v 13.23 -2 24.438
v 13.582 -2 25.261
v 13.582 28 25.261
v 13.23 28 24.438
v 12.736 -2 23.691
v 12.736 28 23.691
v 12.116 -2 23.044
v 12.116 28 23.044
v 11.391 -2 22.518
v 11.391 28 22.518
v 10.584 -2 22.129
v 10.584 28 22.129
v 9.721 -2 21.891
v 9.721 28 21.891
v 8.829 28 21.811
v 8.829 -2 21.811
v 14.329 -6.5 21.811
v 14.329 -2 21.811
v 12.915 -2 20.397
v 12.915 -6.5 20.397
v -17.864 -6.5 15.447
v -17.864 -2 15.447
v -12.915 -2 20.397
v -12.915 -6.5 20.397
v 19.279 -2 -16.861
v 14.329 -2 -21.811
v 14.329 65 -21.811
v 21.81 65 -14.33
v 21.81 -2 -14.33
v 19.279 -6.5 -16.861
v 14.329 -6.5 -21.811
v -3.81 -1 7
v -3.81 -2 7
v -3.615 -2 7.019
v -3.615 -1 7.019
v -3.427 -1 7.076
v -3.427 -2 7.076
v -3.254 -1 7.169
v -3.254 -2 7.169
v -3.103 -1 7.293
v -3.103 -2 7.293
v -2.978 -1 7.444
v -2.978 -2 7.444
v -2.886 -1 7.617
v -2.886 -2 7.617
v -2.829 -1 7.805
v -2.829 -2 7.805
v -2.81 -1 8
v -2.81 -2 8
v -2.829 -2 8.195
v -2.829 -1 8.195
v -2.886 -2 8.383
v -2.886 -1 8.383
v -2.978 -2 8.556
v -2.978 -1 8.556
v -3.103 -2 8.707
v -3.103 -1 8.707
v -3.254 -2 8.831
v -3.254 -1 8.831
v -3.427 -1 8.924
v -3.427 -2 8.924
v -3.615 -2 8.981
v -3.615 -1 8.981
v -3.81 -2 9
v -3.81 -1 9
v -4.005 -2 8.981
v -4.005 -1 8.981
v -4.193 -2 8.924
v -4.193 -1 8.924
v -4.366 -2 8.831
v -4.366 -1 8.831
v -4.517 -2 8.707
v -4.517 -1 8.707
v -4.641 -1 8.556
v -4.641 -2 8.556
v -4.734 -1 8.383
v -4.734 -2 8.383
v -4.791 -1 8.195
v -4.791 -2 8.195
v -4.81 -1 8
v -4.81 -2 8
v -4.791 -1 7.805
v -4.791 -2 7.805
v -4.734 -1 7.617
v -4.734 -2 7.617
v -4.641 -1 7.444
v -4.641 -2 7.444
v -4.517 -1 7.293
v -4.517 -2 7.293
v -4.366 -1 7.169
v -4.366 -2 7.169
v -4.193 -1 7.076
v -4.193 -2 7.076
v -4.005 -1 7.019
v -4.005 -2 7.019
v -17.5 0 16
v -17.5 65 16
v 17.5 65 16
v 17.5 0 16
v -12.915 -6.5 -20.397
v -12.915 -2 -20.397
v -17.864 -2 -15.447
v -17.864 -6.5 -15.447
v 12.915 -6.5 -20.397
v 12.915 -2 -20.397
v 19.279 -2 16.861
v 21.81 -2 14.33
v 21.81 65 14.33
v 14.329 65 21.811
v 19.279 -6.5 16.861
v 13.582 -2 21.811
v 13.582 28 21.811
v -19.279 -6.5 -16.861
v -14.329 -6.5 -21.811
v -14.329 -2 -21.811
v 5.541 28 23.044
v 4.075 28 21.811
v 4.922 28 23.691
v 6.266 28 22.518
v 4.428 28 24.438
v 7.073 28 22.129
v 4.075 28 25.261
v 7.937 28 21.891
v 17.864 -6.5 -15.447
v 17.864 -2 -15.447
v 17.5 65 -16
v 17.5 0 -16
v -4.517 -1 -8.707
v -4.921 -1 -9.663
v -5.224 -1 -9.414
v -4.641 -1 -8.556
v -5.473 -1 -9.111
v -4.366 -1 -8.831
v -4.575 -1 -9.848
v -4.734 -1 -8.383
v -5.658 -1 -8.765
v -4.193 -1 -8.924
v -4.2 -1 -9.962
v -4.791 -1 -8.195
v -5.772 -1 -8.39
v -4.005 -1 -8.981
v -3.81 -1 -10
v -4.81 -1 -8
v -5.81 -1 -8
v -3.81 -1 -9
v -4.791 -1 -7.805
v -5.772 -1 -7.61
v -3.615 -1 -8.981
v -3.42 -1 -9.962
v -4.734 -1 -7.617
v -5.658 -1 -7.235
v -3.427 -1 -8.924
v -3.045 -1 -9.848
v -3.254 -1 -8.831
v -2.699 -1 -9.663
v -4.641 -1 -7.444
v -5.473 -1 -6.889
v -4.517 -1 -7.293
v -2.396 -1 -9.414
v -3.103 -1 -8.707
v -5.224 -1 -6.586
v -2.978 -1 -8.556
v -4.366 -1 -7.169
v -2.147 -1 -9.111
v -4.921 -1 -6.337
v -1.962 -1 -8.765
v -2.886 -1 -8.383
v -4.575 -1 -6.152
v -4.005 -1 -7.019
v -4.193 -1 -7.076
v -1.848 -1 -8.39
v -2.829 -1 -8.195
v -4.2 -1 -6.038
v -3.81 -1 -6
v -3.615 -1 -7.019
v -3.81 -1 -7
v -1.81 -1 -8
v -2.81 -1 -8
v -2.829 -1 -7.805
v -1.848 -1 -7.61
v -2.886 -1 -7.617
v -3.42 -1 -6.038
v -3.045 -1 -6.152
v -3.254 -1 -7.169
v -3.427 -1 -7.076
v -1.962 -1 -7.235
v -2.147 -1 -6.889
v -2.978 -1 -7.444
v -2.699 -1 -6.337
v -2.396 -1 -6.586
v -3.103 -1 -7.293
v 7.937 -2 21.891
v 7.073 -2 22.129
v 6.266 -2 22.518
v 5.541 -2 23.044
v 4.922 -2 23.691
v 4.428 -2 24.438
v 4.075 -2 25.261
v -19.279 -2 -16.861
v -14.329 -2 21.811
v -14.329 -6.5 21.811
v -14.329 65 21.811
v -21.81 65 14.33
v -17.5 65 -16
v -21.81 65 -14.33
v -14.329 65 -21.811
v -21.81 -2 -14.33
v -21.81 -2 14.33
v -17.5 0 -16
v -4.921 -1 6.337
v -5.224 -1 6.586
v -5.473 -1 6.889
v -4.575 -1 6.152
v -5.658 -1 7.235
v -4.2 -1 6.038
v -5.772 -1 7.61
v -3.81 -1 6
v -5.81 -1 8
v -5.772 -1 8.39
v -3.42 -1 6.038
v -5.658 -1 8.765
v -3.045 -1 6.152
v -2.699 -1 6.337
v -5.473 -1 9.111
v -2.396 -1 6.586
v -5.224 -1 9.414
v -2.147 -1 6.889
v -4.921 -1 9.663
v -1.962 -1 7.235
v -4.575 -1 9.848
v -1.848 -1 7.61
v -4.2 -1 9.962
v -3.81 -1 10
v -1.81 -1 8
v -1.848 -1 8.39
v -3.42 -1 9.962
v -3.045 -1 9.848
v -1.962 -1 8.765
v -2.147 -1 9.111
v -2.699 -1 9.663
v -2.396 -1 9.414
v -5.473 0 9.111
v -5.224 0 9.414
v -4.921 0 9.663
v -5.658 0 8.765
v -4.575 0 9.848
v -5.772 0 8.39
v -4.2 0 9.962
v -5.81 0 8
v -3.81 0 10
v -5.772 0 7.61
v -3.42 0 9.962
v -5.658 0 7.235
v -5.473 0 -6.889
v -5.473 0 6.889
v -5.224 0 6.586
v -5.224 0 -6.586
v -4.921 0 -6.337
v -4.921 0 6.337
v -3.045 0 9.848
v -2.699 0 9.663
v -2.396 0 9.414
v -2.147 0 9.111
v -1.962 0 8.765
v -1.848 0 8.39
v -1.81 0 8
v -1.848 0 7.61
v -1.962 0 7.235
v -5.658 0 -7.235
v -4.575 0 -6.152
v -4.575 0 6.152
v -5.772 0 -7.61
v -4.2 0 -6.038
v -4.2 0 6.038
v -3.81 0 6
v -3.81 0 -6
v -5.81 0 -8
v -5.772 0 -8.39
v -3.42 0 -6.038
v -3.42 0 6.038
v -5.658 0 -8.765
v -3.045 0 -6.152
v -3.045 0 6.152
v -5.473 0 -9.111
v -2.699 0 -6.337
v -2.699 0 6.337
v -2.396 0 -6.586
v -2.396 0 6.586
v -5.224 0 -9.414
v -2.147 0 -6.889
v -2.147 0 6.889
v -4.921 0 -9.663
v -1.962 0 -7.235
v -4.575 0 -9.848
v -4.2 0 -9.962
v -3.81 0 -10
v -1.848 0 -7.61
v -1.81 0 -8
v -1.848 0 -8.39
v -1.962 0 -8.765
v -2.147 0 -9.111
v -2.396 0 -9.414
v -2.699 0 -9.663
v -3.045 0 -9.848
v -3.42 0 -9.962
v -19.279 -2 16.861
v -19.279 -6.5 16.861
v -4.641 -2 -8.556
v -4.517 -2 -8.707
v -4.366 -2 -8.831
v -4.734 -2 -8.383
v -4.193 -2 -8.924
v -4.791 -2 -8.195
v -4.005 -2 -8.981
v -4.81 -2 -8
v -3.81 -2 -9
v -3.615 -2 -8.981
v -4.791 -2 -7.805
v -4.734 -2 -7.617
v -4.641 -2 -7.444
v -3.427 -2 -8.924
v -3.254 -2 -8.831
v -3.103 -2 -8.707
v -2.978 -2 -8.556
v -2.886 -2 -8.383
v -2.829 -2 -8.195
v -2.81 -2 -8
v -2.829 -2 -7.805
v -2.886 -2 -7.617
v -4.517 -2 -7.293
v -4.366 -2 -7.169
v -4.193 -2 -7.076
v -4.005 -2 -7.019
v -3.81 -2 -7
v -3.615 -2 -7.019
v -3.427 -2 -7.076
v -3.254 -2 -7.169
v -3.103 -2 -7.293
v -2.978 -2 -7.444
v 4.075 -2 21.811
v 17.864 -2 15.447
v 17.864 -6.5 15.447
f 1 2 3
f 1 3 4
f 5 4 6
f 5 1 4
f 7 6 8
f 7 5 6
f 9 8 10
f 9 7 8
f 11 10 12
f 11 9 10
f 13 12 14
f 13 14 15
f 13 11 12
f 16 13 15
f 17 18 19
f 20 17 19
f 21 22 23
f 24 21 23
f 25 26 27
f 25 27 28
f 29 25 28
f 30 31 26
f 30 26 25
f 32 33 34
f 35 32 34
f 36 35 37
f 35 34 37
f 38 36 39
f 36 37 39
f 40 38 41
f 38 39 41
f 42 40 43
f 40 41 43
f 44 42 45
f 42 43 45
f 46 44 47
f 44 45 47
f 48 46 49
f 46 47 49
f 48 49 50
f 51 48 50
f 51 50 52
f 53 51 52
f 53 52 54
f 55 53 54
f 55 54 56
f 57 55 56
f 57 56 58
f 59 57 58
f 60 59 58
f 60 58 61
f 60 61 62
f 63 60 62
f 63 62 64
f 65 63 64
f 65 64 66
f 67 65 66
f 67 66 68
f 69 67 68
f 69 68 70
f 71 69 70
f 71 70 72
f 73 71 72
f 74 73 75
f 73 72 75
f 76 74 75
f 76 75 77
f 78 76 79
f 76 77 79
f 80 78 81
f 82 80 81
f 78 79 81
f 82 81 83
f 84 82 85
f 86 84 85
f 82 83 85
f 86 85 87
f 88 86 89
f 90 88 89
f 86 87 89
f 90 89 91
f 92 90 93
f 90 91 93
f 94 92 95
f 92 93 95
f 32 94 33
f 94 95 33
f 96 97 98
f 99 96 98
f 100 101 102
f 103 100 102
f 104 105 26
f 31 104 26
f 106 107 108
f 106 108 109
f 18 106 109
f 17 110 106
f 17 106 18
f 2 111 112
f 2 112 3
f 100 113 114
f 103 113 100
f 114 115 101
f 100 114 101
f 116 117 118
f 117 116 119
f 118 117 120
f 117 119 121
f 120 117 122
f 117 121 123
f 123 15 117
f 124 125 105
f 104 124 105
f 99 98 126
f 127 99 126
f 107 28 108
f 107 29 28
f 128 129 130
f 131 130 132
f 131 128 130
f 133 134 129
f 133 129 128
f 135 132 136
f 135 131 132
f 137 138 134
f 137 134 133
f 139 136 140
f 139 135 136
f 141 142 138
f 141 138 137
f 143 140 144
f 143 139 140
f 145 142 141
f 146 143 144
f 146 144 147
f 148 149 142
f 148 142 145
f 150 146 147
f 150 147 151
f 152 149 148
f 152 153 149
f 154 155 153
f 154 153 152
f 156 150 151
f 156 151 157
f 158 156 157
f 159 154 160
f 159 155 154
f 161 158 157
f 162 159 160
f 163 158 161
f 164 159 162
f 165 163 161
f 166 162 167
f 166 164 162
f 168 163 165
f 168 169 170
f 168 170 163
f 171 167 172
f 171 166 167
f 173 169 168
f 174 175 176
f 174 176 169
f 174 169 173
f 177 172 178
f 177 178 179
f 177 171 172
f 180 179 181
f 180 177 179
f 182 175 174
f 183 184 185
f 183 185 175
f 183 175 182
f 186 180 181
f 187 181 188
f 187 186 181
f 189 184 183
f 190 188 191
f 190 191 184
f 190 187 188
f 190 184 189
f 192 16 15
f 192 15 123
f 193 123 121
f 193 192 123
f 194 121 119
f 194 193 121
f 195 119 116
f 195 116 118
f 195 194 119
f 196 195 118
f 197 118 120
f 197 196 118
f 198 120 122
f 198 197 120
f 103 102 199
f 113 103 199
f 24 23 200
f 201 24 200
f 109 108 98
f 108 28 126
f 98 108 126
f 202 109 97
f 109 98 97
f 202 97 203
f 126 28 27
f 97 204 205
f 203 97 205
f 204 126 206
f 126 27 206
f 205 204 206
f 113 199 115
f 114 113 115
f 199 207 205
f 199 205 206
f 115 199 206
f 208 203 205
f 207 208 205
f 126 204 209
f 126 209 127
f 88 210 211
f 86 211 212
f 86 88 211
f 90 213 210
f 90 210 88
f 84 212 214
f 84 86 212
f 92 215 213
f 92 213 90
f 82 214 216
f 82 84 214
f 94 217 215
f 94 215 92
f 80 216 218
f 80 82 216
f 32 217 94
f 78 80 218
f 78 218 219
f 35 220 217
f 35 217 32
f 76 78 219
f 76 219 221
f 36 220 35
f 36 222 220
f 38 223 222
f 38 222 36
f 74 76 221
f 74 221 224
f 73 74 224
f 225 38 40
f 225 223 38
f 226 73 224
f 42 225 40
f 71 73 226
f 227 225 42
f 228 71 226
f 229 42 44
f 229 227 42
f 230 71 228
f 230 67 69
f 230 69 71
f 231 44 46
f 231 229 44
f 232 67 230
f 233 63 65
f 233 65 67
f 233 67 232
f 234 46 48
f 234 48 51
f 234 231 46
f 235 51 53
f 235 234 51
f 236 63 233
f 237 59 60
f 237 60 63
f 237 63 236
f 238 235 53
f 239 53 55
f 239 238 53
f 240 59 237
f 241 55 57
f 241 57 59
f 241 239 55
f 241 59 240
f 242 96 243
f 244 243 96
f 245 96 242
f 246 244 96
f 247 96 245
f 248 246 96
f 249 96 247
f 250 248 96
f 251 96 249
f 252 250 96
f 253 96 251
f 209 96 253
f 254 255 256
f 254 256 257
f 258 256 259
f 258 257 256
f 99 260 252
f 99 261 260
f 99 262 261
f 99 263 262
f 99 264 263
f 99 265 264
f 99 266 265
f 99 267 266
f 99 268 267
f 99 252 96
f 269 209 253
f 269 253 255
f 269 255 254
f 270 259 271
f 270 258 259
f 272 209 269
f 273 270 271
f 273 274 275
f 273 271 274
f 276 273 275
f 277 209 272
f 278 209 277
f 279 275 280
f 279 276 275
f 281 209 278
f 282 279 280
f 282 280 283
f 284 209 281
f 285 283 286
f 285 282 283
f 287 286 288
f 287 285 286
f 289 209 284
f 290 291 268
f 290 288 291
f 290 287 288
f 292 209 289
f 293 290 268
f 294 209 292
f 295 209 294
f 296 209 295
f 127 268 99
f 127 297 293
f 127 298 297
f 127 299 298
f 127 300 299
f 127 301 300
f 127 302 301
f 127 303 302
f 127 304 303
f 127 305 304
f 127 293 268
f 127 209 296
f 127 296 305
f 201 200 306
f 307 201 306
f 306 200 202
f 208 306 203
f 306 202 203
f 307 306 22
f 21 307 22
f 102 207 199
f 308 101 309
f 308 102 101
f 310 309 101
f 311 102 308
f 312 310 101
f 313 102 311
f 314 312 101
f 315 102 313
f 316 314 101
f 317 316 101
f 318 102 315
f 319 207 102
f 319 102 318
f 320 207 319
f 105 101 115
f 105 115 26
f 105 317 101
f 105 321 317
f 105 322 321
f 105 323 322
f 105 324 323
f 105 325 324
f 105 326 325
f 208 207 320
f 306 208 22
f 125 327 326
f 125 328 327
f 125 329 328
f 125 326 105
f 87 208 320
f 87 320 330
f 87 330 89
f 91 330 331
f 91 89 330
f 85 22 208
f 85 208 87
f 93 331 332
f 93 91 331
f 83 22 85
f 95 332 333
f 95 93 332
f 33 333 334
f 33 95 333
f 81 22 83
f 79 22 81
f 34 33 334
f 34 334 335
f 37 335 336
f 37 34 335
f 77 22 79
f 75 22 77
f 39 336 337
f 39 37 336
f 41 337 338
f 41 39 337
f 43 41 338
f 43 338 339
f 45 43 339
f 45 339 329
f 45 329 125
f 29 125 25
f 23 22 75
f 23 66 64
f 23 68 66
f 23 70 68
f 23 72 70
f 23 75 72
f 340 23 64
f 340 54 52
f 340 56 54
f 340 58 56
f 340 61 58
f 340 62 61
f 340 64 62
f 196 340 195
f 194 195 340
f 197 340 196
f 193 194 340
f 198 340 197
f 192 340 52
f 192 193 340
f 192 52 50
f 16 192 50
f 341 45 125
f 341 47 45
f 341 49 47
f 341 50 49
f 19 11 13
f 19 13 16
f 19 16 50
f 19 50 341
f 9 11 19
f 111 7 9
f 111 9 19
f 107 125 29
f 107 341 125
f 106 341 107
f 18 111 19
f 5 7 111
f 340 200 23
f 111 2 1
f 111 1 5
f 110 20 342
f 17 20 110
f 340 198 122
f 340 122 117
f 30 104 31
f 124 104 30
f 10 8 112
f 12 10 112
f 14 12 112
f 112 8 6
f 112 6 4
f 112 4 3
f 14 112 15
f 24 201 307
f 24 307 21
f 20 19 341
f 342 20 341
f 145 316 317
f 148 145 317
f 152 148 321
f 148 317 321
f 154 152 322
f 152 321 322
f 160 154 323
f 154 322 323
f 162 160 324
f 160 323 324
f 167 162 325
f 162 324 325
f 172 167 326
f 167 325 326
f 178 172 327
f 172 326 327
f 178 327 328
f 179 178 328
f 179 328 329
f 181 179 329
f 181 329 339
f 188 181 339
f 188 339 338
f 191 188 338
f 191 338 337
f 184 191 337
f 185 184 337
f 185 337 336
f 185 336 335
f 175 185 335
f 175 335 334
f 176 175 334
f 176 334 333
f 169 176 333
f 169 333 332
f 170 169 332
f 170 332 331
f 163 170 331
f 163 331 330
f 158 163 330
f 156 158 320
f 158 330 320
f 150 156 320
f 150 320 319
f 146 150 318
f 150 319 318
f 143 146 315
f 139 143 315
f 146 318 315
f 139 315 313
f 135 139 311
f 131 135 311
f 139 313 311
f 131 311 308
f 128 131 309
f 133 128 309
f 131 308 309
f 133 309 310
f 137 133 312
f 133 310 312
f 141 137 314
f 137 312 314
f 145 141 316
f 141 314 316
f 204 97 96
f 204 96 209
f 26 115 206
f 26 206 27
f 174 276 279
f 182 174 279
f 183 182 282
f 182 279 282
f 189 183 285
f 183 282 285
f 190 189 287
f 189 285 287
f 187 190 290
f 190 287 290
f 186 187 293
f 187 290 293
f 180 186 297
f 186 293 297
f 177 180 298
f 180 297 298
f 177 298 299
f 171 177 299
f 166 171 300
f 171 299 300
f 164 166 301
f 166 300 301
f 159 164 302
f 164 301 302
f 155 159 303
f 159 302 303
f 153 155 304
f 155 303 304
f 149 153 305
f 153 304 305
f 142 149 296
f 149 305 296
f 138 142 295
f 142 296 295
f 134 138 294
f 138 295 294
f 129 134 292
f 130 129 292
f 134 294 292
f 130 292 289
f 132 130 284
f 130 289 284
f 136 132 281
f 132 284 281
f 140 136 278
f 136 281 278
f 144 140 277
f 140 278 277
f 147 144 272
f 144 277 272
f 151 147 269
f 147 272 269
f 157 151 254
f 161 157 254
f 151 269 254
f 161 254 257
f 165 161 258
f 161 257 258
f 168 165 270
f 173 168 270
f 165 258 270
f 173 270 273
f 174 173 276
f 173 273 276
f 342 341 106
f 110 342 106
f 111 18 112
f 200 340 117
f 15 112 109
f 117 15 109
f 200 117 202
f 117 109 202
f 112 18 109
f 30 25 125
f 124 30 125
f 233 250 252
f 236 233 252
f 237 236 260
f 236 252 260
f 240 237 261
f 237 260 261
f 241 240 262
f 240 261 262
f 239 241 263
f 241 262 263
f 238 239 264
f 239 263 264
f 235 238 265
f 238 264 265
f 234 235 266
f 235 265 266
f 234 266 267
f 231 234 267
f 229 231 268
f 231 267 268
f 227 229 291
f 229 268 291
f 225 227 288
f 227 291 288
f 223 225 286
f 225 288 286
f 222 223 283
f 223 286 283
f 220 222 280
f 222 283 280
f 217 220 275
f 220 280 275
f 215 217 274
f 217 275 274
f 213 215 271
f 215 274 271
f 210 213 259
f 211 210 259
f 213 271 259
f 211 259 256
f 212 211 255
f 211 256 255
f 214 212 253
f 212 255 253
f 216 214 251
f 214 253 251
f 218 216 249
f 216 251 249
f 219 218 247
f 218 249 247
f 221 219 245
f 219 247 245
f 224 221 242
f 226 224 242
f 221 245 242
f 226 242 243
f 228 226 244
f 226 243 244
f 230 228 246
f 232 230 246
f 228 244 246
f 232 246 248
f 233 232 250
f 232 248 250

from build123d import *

# Parameters (mm, degrees)
SKETCH_1_W          = 35
SKETCH_1_H          = 32
EXTRUDE_1_DEPTH     = 65
EXTRUDE_2_DEPTH     = 2
SKETCH_2_R          = 1
CUT_EXTRUDE_1_DEPTH = 74.759079051
SKETCH_3_R          = 2
CUT_EXTRUDE_2_DEPTH = 1
EXTRUDE_3_DEPTH     = 4.5
EXTRUDE_4_DEPTH     = 30


with BuildPart() as part:
    # Эскиз1 → Бобышка-Вытянуть1 (new body)
    with BuildSketch(Plane(origin=(0, 0, 0), x_dir=(1, 0, 0), z_dir=(0, 1, 0))):
        Polygon((-14.328756252, 21.811189745), (-21.809945997, 14.33), (-21.809945997, -14.33), (-14.328756252, -21.811189745), (14.328756252, -21.811189745), (21.809945997, -14.33), (21.809945997, 14.33), (14.328756252, 21.811189745), align=None)
        Rectangle(SKETCH_1_W, SKETCH_1_H, mode=Mode.SUBTRACT)
    extrude(amount=EXTRUDE_1_DEPTH)

    # Эскиз1<3> → Бобышка-Вытянуть2 (add)
    with BuildSketch(Plane(origin=(0, 0, 0), x_dir=(1, 0, 0), z_dir=(0, 1, 0))):
        Polygon((-14.328756252, 21.811189745), (-21.809945997, 14.33), (-21.809945997, -14.33), (-14.328756252, -21.811189745), (14.328756252, -21.811189745), (21.809945997, -14.33), (21.809945997, 14.33), (14.328756252, 21.811189745), align=None)
    extrude(amount=-EXTRUDE_2_DEPTH)

    # Эскиз2 → Вырез-Вытянуть1 (cut, through all)
    with BuildSketch(Plane.XZ.offset(2)):
        with Locations((-3.809945997, 8)):
            Circle(SKETCH_2_R)
        with Locations((-3.809945997, -8)):
            Circle(SKETCH_2_R)
    extrude(amount=-CUT_EXTRUDE_1_DEPTH, mode=Mode.SUBTRACT)

    # Эскиз3 → Вырез-Вытянуть2 (cut)
    with BuildSketch(Plane(origin=(0, 0, 0), x_dir=(1, 0, 0), z_dir=(0, 1, 0))):
        with Locations((-3.809945997, 8)):
            Circle(SKETCH_3_R)
        with Locations((-3.809945997, -8)):
            Circle(SKETCH_3_R)
    extrude(amount=-CUT_EXTRUDE_2_DEPTH, mode=Mode.SUBTRACT)

    # Эскиз4 → Бобышка-Вытянуть3 (add)
    with BuildSketch(Plane.XZ.offset(2)):
        Polygon((-14.328756252, 21.811189745), (-19.27850372, 16.861442277), (-17.864290158, 15.447228714), (-12.91454269, 20.396976183), align=None)
        Polygon((19.27850372, 16.861442277), (14.328756252, 21.811189745), (12.91454269, 20.396976183), (17.864290158, 15.447228714), align=None)
        Polygon((12.91454269, -20.396976183), (14.328756252, -21.811189745), (19.27850372, -16.861442277), (17.864290158, -15.447228714), align=None)
        Polygon((-17.864290158, -15.447228714), (-19.27850372, -16.861442277), (-14.328756252, -21.811189745), (-12.91454269, -20.396976183), align=None)
    extrude(amount=EXTRUDE_3_DEPTH)

    # Эскиз5 → Бобышка-Вытянуть4 (add)
    with BuildSketch(Plane.XZ.offset(2)):
        with BuildLine():
            ThreePointArc((8.828756252, 21.811189745), (5.891921221, 22.764586231), (4.075073469, 25.261189745))
            Line((4.075073469, 25.261189745), (4.075073469, 21.811189745))
            Line((4.075073469, 21.811189745), (8.828756252, 21.811189745))
        make_face()
        with BuildLine():
            ThreePointArc((13.582439035, 25.261189745), (11.765591283, 22.764586231), (8.828756252, 21.811189745))
            Line((8.828756252, 21.811189745), (13.582439035, 21.811189745))
            Line((13.582439035, 21.811189745), (13.582439035, 25.261189745))
        make_face()
    extrude(amount=-EXTRUDE_4_DEPTH)


solid = part.part
